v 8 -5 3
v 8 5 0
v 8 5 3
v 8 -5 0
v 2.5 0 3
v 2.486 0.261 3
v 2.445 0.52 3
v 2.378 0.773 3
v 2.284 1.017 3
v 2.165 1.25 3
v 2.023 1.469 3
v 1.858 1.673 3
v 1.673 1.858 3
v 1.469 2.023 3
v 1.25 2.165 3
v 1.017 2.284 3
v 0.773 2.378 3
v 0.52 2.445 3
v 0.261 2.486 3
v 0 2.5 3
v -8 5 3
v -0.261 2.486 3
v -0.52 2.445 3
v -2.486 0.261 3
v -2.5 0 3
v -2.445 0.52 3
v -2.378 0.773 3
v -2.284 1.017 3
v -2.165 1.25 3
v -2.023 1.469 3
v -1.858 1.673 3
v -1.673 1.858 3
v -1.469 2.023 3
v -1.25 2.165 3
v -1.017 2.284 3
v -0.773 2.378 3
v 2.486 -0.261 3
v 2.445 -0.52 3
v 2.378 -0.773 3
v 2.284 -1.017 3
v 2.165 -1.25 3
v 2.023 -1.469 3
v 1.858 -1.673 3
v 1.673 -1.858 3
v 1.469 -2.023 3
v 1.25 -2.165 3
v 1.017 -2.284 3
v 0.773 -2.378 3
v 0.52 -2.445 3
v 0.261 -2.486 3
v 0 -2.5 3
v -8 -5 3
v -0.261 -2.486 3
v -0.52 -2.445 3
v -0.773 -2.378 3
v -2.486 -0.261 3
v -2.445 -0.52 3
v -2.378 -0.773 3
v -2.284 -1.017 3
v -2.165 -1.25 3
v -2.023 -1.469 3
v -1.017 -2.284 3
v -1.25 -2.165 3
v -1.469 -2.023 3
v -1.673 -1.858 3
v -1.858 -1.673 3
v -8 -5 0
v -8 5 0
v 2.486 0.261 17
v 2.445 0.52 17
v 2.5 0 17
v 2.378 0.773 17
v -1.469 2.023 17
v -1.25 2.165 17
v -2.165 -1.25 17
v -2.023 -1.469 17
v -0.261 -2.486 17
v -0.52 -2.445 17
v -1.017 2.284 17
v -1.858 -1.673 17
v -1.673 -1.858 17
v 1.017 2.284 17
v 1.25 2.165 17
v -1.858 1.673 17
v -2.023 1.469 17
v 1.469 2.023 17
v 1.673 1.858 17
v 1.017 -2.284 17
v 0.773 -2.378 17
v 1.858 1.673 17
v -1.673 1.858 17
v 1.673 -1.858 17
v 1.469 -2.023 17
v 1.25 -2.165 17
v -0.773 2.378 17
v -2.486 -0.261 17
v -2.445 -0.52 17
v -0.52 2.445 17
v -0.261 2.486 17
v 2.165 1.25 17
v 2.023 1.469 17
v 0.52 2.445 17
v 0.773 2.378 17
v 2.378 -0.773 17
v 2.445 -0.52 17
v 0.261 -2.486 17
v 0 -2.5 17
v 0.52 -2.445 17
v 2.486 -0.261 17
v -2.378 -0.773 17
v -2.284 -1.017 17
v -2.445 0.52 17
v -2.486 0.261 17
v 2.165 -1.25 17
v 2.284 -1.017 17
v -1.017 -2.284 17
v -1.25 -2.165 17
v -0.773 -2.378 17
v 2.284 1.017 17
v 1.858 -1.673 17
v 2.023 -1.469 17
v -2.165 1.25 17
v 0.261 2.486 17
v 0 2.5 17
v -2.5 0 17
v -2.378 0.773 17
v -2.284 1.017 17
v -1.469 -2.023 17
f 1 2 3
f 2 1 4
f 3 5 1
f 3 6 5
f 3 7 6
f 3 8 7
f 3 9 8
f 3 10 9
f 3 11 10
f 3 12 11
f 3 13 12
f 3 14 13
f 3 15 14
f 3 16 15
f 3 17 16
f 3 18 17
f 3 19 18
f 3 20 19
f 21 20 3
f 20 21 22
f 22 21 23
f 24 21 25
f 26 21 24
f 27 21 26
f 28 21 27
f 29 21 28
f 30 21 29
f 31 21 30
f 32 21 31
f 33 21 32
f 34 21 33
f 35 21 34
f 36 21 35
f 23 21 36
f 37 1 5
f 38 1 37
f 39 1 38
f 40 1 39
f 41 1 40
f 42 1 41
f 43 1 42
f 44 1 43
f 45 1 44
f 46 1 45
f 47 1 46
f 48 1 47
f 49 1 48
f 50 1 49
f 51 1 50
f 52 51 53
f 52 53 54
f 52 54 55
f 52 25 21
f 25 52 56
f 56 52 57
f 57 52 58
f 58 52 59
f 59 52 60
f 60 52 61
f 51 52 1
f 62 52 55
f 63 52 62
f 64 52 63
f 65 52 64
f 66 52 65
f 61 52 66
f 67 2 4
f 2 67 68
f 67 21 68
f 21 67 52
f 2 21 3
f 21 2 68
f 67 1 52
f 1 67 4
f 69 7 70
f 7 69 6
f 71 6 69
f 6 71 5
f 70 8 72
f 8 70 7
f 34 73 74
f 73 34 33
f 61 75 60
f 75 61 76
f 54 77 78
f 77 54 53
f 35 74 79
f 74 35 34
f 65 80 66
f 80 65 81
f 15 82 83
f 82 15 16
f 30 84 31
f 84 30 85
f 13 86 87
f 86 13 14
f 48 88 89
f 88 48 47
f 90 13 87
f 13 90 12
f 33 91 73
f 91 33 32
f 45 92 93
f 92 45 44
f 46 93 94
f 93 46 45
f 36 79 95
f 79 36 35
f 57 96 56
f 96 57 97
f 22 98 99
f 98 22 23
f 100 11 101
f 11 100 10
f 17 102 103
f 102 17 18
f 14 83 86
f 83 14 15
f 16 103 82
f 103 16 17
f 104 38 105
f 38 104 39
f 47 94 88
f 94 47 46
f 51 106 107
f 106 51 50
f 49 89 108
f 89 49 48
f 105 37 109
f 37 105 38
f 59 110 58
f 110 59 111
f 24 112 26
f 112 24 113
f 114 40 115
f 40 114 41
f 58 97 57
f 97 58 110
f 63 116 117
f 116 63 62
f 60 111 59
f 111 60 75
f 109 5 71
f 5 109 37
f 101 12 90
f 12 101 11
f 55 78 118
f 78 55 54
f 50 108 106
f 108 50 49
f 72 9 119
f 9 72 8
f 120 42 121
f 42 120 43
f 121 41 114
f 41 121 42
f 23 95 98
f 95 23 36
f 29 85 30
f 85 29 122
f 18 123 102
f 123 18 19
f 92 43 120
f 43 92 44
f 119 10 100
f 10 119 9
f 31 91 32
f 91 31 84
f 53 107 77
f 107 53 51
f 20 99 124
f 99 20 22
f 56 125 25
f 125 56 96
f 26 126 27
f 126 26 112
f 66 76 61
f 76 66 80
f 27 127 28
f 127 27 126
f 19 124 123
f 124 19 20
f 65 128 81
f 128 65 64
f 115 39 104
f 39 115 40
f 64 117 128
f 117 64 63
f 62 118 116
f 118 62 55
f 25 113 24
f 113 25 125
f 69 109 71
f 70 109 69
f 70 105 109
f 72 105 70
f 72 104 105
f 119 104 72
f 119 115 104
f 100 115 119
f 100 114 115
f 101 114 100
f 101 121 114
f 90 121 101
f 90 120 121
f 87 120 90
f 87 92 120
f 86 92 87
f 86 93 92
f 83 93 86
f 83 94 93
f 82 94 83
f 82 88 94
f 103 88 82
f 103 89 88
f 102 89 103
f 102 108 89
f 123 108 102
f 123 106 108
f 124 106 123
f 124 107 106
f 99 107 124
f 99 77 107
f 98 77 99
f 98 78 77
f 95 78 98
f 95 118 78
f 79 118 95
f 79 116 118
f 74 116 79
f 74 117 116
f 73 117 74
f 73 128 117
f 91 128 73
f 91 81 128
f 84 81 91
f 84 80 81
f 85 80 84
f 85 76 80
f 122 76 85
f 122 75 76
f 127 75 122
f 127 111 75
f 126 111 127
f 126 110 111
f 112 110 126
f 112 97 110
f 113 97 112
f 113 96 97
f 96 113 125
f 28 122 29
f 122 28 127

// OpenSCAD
// T-head slot bolt.
$fn = 60;
eps = 0.02;
shaft_d = 5;
head_l = 16;
shaft_l = 14;
head_w = shaft_d + 5;
head_h = 3;
union() {
    translate([-head_l/2,-head_w/2,0]) cube([head_l,head_w,head_h]);
    translate([0,0,head_h]) cylinder(d=shaft_d,h=shaft_l);
}
